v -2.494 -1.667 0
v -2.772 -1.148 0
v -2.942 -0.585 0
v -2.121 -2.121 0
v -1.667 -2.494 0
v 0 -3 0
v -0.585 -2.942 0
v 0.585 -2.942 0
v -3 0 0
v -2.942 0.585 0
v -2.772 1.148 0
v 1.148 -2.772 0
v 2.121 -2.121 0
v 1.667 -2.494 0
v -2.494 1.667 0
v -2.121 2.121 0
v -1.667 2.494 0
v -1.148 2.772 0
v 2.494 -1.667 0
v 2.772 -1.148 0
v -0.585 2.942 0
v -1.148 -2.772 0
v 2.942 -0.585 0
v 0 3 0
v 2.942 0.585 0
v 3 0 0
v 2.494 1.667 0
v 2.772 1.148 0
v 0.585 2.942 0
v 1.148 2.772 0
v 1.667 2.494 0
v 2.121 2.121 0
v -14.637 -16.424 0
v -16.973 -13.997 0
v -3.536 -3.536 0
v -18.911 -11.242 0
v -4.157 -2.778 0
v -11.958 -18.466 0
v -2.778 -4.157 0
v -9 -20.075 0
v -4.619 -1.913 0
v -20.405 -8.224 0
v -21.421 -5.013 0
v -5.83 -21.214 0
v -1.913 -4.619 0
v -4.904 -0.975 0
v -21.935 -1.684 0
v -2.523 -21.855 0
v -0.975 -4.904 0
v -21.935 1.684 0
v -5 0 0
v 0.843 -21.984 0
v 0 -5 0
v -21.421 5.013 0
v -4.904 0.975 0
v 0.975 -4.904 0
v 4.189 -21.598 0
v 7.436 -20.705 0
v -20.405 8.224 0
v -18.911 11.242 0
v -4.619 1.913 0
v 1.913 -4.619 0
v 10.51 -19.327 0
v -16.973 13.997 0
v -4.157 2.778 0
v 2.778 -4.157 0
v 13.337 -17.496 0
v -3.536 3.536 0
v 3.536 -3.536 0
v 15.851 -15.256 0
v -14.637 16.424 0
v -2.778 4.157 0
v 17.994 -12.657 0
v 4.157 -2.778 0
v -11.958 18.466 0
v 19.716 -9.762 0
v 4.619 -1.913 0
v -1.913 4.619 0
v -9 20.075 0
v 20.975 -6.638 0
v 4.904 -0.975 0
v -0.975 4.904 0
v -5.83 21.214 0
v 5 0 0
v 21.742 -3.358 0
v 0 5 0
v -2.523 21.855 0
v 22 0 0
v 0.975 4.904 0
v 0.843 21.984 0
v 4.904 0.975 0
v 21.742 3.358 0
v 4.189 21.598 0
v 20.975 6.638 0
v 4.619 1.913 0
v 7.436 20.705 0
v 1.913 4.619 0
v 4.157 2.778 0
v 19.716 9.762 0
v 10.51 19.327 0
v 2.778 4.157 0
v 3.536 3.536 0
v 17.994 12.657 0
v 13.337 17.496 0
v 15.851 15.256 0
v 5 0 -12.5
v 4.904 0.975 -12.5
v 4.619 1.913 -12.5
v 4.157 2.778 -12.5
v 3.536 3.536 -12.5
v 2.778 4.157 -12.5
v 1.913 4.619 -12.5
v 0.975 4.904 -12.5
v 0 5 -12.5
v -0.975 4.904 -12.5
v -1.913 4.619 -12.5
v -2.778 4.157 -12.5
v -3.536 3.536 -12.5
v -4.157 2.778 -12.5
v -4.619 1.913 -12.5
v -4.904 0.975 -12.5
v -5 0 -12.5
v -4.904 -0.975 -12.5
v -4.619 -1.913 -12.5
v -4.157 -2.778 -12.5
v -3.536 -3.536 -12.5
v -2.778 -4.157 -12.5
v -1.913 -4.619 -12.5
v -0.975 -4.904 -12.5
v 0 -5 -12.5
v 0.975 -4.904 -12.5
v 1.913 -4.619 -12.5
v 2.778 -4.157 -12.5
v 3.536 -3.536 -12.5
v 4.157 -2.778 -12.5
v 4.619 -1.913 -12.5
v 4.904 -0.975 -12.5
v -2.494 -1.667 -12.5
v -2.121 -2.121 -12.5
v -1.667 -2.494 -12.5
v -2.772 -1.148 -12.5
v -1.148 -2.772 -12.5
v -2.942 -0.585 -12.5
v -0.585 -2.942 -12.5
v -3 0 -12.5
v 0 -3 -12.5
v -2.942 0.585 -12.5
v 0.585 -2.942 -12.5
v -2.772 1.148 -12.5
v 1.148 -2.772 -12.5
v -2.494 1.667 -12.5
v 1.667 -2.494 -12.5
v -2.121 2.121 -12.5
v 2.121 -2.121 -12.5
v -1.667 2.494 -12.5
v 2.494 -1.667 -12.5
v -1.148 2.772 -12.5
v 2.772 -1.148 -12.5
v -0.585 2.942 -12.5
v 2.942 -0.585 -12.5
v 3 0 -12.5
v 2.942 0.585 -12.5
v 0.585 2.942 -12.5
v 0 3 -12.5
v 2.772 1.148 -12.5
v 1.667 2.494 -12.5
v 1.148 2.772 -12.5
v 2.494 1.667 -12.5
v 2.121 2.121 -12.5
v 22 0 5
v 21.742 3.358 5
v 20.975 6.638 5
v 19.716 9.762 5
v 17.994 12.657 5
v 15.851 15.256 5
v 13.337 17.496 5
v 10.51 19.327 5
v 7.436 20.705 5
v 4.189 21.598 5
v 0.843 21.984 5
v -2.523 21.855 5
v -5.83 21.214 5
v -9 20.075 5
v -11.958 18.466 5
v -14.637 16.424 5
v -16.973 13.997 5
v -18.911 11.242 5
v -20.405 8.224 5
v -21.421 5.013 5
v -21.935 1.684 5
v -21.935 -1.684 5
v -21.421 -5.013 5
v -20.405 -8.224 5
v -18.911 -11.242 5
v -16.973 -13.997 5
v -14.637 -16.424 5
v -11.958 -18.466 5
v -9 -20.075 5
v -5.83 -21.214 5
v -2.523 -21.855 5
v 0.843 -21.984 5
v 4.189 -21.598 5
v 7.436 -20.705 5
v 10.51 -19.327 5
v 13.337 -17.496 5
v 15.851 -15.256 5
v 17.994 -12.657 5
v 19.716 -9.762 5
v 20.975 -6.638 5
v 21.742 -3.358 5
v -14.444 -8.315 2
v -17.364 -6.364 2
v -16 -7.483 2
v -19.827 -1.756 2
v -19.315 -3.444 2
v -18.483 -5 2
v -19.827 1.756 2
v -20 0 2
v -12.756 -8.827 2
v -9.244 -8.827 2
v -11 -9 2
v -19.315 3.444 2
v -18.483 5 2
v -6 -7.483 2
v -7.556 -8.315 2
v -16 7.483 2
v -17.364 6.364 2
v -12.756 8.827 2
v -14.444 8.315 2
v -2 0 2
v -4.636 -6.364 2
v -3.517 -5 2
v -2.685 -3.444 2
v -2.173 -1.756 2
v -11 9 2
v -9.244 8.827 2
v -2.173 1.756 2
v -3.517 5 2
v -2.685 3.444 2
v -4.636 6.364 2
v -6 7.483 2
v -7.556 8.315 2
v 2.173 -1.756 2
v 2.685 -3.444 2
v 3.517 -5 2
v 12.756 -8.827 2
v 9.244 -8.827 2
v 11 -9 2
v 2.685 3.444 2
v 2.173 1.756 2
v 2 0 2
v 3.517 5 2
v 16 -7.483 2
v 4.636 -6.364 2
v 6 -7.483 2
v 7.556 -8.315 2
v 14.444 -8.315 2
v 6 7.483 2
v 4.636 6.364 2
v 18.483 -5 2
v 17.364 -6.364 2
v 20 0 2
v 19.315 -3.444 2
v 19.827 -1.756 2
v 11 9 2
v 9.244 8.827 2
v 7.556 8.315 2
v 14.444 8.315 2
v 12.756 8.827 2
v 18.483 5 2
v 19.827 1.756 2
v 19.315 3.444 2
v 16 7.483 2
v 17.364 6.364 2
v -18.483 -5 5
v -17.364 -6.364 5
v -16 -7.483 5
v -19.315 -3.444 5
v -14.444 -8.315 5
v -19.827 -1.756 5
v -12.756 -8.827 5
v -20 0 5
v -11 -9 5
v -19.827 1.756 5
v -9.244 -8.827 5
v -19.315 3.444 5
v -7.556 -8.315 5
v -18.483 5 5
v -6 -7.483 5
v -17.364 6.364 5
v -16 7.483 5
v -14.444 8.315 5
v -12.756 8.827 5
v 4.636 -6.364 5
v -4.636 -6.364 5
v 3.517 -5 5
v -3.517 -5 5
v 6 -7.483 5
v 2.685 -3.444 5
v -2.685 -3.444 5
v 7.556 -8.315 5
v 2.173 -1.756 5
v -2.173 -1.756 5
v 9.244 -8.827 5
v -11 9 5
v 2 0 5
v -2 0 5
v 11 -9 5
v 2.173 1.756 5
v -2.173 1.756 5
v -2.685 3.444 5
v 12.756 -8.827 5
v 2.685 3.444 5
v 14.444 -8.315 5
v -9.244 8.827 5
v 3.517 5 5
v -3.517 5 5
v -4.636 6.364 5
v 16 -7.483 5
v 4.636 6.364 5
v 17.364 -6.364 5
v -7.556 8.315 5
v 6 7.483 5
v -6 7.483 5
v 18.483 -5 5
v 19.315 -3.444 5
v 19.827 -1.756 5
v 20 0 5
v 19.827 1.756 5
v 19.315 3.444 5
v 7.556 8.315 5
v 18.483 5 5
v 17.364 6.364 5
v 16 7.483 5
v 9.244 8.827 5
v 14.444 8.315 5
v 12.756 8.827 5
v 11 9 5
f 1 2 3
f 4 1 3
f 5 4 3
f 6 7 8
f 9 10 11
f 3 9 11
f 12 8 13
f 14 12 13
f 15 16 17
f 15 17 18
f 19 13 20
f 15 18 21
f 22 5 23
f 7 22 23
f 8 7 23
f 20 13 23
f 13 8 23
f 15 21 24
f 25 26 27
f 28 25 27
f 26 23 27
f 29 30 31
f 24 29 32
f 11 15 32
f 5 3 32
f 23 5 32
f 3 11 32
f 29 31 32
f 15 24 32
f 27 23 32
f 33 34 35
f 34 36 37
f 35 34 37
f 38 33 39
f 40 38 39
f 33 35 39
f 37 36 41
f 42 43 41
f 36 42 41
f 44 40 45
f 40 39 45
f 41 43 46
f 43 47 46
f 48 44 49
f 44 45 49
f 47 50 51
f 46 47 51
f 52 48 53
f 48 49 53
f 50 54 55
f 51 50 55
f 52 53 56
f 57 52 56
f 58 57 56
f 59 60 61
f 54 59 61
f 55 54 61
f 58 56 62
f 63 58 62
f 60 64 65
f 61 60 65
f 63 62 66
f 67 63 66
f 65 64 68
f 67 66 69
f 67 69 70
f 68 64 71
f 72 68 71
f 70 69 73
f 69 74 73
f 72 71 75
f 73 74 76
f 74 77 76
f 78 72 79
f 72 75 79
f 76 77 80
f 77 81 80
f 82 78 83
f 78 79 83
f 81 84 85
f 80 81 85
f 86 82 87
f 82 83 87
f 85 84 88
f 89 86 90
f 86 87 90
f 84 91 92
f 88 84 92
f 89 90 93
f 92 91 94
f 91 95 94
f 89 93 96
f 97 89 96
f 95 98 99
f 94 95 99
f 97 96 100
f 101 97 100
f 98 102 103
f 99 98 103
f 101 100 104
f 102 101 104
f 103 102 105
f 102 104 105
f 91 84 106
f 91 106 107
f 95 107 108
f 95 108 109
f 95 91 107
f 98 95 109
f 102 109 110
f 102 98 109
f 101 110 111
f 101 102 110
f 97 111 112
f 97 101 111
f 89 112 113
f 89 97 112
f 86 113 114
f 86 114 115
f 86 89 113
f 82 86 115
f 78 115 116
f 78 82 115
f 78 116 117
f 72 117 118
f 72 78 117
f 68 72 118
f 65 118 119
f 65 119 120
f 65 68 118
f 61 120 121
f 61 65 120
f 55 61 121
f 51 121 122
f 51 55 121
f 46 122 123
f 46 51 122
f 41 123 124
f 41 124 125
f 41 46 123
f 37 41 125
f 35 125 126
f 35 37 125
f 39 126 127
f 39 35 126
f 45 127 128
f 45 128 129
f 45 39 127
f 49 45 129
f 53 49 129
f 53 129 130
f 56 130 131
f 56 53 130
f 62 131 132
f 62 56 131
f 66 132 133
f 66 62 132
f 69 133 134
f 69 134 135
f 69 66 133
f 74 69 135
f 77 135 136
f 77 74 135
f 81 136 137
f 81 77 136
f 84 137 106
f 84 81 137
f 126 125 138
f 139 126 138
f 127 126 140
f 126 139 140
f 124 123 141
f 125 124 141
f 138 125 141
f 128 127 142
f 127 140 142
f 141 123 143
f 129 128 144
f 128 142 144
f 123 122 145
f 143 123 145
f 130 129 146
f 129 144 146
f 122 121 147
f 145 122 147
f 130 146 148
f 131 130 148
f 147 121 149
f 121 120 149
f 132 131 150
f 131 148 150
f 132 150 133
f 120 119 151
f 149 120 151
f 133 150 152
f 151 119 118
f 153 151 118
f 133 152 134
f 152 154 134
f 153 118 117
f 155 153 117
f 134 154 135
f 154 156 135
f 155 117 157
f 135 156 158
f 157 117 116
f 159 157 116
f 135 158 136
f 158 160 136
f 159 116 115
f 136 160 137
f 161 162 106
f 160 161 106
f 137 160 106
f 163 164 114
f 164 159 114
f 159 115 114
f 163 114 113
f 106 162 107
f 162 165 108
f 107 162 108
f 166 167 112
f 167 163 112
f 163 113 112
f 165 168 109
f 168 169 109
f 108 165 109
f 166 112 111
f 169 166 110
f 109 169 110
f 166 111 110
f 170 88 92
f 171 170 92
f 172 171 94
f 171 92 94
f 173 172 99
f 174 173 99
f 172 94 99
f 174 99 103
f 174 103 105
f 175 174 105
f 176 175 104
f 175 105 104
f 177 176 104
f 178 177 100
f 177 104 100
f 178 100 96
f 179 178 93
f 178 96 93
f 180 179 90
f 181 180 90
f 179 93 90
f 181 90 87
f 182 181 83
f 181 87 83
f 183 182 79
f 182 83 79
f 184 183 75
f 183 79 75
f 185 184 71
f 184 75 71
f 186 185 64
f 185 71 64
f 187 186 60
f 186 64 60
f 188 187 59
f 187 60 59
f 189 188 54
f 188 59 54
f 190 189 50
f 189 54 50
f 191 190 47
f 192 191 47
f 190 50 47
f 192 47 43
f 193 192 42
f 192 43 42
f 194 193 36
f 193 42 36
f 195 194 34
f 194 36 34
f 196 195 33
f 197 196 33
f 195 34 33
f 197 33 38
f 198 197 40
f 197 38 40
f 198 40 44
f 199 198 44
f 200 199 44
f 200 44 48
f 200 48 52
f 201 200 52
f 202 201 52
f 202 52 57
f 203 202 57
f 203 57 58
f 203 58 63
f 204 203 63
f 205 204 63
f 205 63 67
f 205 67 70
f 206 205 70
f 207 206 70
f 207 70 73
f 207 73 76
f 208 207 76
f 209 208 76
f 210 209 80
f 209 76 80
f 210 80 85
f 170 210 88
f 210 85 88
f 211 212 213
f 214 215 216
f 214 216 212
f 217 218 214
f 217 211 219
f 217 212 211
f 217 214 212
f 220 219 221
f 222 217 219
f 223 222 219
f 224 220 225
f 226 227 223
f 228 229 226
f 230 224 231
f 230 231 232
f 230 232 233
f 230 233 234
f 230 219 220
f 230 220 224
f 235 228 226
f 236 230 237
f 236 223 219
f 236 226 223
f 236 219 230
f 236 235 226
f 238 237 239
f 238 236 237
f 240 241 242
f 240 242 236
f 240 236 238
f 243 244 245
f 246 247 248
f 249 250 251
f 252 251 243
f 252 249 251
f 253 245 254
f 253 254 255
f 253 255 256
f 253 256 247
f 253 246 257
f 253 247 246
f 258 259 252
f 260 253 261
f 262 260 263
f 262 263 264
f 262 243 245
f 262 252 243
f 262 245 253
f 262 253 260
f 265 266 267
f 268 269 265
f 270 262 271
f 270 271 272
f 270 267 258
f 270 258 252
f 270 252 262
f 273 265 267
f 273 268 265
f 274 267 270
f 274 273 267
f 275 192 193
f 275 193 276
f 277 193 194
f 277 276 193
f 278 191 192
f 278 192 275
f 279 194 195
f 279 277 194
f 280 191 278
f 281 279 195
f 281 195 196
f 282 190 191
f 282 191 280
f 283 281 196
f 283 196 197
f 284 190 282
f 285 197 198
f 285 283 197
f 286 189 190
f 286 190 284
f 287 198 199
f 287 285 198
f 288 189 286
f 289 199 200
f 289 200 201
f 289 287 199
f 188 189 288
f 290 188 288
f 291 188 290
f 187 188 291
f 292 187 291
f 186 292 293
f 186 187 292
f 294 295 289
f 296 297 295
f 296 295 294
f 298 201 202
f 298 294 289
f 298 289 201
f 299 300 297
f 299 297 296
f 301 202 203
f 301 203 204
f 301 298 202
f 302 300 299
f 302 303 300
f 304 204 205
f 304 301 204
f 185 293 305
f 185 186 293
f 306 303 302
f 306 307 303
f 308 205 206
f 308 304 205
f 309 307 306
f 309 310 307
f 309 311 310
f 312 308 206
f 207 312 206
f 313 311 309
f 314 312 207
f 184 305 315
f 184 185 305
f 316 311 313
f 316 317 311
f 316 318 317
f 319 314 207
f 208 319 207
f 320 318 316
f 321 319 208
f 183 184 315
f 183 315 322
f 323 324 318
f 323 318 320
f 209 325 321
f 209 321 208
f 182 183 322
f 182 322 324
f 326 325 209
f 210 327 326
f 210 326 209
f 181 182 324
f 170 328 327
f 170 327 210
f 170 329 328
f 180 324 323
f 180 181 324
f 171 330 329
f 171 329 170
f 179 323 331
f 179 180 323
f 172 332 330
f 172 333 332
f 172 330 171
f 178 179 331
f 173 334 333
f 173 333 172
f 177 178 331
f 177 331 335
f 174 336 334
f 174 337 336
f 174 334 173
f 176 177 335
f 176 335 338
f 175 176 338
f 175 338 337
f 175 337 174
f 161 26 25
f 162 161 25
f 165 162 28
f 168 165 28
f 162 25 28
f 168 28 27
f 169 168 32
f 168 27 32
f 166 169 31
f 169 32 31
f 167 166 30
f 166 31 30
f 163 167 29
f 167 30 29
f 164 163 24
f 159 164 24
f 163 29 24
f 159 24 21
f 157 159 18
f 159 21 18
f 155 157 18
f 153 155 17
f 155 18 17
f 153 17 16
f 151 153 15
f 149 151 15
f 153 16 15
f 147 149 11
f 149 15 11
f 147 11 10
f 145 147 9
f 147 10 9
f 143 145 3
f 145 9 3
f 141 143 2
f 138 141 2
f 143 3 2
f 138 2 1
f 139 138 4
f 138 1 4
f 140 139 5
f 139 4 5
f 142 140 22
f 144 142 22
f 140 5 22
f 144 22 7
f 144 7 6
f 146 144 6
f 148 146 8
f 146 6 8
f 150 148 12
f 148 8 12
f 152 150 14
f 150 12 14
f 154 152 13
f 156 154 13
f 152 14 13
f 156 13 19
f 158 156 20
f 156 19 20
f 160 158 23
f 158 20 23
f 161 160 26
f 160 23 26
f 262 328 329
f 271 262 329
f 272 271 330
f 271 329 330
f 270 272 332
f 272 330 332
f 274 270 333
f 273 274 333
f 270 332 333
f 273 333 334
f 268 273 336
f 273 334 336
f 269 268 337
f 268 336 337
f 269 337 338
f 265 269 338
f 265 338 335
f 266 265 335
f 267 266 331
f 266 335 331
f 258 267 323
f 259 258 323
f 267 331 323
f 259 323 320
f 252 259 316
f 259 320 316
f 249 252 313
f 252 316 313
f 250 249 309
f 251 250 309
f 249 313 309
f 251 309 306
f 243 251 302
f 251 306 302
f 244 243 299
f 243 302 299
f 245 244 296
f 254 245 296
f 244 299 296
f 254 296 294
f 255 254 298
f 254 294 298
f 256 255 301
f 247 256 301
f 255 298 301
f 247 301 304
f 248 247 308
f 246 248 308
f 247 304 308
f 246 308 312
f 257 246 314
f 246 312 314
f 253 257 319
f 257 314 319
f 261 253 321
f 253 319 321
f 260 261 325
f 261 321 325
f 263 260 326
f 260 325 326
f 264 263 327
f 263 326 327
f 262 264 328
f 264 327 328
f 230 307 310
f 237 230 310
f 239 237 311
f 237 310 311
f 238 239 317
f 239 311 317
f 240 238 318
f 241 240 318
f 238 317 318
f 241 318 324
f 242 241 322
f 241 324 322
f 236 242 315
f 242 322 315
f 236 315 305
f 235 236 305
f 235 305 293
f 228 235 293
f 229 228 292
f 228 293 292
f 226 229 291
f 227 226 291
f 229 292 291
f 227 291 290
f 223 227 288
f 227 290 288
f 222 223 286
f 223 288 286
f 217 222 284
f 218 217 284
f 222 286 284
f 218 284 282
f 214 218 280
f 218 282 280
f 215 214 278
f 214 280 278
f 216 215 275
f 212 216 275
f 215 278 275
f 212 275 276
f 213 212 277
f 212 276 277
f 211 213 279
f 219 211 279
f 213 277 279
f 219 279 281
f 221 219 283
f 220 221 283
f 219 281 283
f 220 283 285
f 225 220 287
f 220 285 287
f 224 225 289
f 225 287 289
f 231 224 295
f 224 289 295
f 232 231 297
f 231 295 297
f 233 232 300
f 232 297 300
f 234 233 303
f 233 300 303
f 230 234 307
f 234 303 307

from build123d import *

# Parameters (mm, degrees)
F1_R     = 5
F1_R_2   = 3
F3_DEPTH = 12.5
F5_R     = 22
F6_DEPTH = 5
F7_R     = 9
F8_DEPTH = 3


with BuildPart() as f3:
    # F1 (on Top) → F3 (new body)
    with BuildSketch(Plane.XY):
        Circle(F1_R)
        Circle(F1_R_2, mode=Mode.SUBTRACT)
    extrude(amount=-F3_DEPTH)

    # F5 (on Top) → F6 (join)
    with BuildSketch(Plane.XY):
        Circle(F5_R)
    extrude(amount=F6_DEPTH)

    # F7 (on face) → F8 (cut)
    with BuildSketch(Plane.XY.offset(5)):
        with Locations((11, 0)):
            Circle(F7_R)
        with Locations((-11, 0)):
            Circle(F7_R)
    extrude(amount=-F8_DEPTH, mode=Mode.SUBTRACT)


solid = f3.part
